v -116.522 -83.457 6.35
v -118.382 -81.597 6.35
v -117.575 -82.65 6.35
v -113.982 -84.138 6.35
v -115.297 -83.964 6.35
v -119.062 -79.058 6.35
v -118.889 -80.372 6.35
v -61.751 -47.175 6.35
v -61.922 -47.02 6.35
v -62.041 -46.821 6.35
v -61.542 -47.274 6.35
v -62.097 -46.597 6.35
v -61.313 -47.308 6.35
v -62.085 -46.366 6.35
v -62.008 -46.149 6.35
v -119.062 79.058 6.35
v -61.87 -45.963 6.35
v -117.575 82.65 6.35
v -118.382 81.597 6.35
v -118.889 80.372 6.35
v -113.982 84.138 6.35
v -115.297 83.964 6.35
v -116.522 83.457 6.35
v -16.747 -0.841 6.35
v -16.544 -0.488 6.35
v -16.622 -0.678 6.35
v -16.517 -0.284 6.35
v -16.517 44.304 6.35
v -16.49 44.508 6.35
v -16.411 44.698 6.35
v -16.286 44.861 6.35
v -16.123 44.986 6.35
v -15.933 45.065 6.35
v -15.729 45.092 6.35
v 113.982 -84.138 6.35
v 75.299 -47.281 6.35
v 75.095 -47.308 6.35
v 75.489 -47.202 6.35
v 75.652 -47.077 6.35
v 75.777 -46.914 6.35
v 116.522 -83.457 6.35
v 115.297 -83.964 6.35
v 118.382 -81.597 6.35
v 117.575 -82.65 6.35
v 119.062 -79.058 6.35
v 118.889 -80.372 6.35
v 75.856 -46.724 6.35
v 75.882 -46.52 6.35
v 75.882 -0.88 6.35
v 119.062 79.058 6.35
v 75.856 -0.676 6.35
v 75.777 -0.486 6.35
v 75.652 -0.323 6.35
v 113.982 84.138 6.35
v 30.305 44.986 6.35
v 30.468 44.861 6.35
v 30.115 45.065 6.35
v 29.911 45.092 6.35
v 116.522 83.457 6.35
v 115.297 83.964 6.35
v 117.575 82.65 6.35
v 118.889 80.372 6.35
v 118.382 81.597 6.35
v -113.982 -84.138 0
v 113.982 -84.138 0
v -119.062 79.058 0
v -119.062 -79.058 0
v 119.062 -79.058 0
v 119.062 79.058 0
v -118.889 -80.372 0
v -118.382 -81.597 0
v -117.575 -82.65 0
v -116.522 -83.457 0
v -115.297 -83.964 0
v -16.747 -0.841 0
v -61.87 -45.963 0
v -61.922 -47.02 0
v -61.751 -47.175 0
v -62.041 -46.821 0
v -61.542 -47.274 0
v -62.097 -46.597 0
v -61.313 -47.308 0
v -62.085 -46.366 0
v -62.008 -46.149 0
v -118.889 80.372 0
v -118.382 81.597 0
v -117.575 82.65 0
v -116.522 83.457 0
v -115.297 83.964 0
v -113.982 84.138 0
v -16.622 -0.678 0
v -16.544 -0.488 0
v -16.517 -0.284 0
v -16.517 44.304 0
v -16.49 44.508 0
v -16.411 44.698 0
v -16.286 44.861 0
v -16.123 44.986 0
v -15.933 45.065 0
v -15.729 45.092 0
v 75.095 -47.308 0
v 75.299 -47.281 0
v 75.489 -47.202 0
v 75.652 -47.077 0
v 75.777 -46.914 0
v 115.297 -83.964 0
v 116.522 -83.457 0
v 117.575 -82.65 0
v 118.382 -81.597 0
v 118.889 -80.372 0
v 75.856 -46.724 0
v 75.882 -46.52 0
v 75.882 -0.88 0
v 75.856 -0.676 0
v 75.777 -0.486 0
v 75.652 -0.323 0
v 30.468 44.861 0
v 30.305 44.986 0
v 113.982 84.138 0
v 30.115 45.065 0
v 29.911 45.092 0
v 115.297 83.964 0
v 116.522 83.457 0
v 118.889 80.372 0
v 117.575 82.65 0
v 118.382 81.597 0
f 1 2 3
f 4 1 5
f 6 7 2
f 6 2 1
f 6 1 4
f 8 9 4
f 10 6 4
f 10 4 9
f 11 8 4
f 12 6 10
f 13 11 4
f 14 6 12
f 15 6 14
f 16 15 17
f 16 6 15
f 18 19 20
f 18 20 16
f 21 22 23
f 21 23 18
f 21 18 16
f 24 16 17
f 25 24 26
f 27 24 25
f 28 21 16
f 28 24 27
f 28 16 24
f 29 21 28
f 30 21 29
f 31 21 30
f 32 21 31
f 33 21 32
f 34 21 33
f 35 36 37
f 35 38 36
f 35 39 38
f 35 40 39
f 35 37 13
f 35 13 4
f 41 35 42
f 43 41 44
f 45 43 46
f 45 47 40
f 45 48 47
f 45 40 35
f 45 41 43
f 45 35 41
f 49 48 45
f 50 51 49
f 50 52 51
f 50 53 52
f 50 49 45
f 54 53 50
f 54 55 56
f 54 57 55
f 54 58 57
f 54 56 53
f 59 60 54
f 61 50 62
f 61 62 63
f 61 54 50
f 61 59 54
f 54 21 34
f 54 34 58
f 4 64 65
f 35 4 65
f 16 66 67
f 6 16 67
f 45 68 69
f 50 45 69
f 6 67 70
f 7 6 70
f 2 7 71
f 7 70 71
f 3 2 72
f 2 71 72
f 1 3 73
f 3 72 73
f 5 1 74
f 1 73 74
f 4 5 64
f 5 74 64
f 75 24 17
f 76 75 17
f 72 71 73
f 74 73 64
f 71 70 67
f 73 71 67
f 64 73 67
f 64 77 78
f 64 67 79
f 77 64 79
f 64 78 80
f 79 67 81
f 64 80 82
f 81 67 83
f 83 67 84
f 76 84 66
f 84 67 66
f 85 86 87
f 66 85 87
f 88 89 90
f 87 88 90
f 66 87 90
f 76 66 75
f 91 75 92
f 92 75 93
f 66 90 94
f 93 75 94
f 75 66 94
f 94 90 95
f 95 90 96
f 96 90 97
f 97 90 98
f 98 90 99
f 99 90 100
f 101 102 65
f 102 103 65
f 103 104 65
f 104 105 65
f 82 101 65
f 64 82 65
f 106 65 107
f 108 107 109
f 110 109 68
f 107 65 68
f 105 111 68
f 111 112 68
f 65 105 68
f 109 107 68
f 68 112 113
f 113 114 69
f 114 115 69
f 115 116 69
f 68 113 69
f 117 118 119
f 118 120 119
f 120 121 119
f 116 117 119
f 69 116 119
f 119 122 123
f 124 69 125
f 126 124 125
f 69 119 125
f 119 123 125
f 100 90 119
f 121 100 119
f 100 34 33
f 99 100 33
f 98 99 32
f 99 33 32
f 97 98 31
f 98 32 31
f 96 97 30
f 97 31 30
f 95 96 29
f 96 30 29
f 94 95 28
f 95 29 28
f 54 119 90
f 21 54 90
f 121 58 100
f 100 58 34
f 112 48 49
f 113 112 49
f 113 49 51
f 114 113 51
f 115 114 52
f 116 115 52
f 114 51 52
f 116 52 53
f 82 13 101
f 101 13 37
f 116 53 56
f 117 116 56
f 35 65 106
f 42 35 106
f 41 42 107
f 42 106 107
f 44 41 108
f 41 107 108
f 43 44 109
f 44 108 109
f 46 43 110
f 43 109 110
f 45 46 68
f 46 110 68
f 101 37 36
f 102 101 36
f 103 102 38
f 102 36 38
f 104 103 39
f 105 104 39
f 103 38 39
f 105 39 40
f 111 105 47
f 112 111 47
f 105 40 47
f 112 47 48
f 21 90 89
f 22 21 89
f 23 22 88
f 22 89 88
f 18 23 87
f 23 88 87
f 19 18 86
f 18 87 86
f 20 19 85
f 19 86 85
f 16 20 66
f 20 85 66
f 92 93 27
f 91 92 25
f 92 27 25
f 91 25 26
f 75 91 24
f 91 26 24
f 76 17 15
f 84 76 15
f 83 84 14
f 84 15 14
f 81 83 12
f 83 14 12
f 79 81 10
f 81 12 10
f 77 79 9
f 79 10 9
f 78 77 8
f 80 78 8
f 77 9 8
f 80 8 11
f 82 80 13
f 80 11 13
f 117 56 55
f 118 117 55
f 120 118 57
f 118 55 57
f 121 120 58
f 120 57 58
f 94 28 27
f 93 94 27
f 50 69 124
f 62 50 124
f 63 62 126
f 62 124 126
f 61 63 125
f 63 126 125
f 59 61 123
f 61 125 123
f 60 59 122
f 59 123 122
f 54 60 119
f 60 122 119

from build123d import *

# Parameters (mm, degrees)
F1_DEPTH = 6.35
F3_DEPTH = 25.4
F5_DEPTH = 25.4


with BuildPart() as f1:
    # F0 (on Top) → F1 (new body)
    with BuildSketch(Plane.XY):
        with BuildLine():
            Line((113.9825, 84.1375), (-113.9825, 84.1375))
            ThreePointArc((-113.9825, 84.1375), (-117.574602, 82.649602), (-119.0625, 79.0575))
            Line((-119.0625, 79.0575), (-119.0625, -79.0575))
            ThreePointArc((-119.0625, -79.0575), (-117.574602, -82.649602), (-113.9825, -84.1375))
            Line((-113.9825, -84.1375), (113.9825, -84.1375))
            ThreePointArc((113.9825, -84.1375), (117.574602, -82.649602), (119.0625, -79.0575))
            Line((119.0625, -79.0575), (119.0625, 79.0575))
            ThreePointArc((119.0625, 79.0575), (117.574602, 82.649602), (113.9825, 84.1375))
        make_face()
    extrude(amount=F1_DEPTH)

    # F2 (on face) → F3 (cut)
    with BuildSketch(Plane.XY.offset(6.35)):
        Polygon((-15.246781, -1.136219), (-60.148061, -46.0375), (74.6125, -46.0375), (74.6125, -1.0795), (29.711219, 43.821781), (-15.246781, 43.821781), align=None)
    extrude(amount=-F3_DEPTH, mode=Mode.SUBTRACT)

    # F4 (on face) → F5 (cut)
    with BuildSketch(Plane.XY.offset(6.35)):
        with BuildLine():
            ThreePointArc((75.8825, -0.879601), (75.822563, -0.578276), (75.651876, -0.322825))
            Line((75.651876, -0.322825), (30.467895, 44.861156))
            ThreePointArc((30.467895, 44.861156), (30.212444, 45.031843), (29.911119, 45.091781))
            Line((29.911119, 45.091781), (-15.729381, 45.091781))
            ThreePointArc((-15.729381, 45.091781), (-16.286156, 44.861156), (-16.516781, 44.304381))
            Line((-16.516781, 44.304381), (-16.516781, -0.284016))
            ThreePointArc((-16.516781, -0.284016), (-16.576718, -0.585341), (-16.747405, -0.840792))
            Line((-16.747405, -0.840792), (-61.869937, -45.963324))
            ThreePointArc((-61.869937, -45.963324), (-62.040623, -46.821425), (-61.313161, -47.3075))
            Line((-61.313161, -47.3075), (75.0951, -47.3075))
            ThreePointArc((75.0951, -47.3075), (75.651876, -47.076876), (75.8825, -46.5201))
            Line((75.8825, -46.5201), (75.8825, -0.879601))
        make_face()
    extrude(amount=-F5_DEPTH, mode=Mode.SUBTRACT)


solid = f1.part
